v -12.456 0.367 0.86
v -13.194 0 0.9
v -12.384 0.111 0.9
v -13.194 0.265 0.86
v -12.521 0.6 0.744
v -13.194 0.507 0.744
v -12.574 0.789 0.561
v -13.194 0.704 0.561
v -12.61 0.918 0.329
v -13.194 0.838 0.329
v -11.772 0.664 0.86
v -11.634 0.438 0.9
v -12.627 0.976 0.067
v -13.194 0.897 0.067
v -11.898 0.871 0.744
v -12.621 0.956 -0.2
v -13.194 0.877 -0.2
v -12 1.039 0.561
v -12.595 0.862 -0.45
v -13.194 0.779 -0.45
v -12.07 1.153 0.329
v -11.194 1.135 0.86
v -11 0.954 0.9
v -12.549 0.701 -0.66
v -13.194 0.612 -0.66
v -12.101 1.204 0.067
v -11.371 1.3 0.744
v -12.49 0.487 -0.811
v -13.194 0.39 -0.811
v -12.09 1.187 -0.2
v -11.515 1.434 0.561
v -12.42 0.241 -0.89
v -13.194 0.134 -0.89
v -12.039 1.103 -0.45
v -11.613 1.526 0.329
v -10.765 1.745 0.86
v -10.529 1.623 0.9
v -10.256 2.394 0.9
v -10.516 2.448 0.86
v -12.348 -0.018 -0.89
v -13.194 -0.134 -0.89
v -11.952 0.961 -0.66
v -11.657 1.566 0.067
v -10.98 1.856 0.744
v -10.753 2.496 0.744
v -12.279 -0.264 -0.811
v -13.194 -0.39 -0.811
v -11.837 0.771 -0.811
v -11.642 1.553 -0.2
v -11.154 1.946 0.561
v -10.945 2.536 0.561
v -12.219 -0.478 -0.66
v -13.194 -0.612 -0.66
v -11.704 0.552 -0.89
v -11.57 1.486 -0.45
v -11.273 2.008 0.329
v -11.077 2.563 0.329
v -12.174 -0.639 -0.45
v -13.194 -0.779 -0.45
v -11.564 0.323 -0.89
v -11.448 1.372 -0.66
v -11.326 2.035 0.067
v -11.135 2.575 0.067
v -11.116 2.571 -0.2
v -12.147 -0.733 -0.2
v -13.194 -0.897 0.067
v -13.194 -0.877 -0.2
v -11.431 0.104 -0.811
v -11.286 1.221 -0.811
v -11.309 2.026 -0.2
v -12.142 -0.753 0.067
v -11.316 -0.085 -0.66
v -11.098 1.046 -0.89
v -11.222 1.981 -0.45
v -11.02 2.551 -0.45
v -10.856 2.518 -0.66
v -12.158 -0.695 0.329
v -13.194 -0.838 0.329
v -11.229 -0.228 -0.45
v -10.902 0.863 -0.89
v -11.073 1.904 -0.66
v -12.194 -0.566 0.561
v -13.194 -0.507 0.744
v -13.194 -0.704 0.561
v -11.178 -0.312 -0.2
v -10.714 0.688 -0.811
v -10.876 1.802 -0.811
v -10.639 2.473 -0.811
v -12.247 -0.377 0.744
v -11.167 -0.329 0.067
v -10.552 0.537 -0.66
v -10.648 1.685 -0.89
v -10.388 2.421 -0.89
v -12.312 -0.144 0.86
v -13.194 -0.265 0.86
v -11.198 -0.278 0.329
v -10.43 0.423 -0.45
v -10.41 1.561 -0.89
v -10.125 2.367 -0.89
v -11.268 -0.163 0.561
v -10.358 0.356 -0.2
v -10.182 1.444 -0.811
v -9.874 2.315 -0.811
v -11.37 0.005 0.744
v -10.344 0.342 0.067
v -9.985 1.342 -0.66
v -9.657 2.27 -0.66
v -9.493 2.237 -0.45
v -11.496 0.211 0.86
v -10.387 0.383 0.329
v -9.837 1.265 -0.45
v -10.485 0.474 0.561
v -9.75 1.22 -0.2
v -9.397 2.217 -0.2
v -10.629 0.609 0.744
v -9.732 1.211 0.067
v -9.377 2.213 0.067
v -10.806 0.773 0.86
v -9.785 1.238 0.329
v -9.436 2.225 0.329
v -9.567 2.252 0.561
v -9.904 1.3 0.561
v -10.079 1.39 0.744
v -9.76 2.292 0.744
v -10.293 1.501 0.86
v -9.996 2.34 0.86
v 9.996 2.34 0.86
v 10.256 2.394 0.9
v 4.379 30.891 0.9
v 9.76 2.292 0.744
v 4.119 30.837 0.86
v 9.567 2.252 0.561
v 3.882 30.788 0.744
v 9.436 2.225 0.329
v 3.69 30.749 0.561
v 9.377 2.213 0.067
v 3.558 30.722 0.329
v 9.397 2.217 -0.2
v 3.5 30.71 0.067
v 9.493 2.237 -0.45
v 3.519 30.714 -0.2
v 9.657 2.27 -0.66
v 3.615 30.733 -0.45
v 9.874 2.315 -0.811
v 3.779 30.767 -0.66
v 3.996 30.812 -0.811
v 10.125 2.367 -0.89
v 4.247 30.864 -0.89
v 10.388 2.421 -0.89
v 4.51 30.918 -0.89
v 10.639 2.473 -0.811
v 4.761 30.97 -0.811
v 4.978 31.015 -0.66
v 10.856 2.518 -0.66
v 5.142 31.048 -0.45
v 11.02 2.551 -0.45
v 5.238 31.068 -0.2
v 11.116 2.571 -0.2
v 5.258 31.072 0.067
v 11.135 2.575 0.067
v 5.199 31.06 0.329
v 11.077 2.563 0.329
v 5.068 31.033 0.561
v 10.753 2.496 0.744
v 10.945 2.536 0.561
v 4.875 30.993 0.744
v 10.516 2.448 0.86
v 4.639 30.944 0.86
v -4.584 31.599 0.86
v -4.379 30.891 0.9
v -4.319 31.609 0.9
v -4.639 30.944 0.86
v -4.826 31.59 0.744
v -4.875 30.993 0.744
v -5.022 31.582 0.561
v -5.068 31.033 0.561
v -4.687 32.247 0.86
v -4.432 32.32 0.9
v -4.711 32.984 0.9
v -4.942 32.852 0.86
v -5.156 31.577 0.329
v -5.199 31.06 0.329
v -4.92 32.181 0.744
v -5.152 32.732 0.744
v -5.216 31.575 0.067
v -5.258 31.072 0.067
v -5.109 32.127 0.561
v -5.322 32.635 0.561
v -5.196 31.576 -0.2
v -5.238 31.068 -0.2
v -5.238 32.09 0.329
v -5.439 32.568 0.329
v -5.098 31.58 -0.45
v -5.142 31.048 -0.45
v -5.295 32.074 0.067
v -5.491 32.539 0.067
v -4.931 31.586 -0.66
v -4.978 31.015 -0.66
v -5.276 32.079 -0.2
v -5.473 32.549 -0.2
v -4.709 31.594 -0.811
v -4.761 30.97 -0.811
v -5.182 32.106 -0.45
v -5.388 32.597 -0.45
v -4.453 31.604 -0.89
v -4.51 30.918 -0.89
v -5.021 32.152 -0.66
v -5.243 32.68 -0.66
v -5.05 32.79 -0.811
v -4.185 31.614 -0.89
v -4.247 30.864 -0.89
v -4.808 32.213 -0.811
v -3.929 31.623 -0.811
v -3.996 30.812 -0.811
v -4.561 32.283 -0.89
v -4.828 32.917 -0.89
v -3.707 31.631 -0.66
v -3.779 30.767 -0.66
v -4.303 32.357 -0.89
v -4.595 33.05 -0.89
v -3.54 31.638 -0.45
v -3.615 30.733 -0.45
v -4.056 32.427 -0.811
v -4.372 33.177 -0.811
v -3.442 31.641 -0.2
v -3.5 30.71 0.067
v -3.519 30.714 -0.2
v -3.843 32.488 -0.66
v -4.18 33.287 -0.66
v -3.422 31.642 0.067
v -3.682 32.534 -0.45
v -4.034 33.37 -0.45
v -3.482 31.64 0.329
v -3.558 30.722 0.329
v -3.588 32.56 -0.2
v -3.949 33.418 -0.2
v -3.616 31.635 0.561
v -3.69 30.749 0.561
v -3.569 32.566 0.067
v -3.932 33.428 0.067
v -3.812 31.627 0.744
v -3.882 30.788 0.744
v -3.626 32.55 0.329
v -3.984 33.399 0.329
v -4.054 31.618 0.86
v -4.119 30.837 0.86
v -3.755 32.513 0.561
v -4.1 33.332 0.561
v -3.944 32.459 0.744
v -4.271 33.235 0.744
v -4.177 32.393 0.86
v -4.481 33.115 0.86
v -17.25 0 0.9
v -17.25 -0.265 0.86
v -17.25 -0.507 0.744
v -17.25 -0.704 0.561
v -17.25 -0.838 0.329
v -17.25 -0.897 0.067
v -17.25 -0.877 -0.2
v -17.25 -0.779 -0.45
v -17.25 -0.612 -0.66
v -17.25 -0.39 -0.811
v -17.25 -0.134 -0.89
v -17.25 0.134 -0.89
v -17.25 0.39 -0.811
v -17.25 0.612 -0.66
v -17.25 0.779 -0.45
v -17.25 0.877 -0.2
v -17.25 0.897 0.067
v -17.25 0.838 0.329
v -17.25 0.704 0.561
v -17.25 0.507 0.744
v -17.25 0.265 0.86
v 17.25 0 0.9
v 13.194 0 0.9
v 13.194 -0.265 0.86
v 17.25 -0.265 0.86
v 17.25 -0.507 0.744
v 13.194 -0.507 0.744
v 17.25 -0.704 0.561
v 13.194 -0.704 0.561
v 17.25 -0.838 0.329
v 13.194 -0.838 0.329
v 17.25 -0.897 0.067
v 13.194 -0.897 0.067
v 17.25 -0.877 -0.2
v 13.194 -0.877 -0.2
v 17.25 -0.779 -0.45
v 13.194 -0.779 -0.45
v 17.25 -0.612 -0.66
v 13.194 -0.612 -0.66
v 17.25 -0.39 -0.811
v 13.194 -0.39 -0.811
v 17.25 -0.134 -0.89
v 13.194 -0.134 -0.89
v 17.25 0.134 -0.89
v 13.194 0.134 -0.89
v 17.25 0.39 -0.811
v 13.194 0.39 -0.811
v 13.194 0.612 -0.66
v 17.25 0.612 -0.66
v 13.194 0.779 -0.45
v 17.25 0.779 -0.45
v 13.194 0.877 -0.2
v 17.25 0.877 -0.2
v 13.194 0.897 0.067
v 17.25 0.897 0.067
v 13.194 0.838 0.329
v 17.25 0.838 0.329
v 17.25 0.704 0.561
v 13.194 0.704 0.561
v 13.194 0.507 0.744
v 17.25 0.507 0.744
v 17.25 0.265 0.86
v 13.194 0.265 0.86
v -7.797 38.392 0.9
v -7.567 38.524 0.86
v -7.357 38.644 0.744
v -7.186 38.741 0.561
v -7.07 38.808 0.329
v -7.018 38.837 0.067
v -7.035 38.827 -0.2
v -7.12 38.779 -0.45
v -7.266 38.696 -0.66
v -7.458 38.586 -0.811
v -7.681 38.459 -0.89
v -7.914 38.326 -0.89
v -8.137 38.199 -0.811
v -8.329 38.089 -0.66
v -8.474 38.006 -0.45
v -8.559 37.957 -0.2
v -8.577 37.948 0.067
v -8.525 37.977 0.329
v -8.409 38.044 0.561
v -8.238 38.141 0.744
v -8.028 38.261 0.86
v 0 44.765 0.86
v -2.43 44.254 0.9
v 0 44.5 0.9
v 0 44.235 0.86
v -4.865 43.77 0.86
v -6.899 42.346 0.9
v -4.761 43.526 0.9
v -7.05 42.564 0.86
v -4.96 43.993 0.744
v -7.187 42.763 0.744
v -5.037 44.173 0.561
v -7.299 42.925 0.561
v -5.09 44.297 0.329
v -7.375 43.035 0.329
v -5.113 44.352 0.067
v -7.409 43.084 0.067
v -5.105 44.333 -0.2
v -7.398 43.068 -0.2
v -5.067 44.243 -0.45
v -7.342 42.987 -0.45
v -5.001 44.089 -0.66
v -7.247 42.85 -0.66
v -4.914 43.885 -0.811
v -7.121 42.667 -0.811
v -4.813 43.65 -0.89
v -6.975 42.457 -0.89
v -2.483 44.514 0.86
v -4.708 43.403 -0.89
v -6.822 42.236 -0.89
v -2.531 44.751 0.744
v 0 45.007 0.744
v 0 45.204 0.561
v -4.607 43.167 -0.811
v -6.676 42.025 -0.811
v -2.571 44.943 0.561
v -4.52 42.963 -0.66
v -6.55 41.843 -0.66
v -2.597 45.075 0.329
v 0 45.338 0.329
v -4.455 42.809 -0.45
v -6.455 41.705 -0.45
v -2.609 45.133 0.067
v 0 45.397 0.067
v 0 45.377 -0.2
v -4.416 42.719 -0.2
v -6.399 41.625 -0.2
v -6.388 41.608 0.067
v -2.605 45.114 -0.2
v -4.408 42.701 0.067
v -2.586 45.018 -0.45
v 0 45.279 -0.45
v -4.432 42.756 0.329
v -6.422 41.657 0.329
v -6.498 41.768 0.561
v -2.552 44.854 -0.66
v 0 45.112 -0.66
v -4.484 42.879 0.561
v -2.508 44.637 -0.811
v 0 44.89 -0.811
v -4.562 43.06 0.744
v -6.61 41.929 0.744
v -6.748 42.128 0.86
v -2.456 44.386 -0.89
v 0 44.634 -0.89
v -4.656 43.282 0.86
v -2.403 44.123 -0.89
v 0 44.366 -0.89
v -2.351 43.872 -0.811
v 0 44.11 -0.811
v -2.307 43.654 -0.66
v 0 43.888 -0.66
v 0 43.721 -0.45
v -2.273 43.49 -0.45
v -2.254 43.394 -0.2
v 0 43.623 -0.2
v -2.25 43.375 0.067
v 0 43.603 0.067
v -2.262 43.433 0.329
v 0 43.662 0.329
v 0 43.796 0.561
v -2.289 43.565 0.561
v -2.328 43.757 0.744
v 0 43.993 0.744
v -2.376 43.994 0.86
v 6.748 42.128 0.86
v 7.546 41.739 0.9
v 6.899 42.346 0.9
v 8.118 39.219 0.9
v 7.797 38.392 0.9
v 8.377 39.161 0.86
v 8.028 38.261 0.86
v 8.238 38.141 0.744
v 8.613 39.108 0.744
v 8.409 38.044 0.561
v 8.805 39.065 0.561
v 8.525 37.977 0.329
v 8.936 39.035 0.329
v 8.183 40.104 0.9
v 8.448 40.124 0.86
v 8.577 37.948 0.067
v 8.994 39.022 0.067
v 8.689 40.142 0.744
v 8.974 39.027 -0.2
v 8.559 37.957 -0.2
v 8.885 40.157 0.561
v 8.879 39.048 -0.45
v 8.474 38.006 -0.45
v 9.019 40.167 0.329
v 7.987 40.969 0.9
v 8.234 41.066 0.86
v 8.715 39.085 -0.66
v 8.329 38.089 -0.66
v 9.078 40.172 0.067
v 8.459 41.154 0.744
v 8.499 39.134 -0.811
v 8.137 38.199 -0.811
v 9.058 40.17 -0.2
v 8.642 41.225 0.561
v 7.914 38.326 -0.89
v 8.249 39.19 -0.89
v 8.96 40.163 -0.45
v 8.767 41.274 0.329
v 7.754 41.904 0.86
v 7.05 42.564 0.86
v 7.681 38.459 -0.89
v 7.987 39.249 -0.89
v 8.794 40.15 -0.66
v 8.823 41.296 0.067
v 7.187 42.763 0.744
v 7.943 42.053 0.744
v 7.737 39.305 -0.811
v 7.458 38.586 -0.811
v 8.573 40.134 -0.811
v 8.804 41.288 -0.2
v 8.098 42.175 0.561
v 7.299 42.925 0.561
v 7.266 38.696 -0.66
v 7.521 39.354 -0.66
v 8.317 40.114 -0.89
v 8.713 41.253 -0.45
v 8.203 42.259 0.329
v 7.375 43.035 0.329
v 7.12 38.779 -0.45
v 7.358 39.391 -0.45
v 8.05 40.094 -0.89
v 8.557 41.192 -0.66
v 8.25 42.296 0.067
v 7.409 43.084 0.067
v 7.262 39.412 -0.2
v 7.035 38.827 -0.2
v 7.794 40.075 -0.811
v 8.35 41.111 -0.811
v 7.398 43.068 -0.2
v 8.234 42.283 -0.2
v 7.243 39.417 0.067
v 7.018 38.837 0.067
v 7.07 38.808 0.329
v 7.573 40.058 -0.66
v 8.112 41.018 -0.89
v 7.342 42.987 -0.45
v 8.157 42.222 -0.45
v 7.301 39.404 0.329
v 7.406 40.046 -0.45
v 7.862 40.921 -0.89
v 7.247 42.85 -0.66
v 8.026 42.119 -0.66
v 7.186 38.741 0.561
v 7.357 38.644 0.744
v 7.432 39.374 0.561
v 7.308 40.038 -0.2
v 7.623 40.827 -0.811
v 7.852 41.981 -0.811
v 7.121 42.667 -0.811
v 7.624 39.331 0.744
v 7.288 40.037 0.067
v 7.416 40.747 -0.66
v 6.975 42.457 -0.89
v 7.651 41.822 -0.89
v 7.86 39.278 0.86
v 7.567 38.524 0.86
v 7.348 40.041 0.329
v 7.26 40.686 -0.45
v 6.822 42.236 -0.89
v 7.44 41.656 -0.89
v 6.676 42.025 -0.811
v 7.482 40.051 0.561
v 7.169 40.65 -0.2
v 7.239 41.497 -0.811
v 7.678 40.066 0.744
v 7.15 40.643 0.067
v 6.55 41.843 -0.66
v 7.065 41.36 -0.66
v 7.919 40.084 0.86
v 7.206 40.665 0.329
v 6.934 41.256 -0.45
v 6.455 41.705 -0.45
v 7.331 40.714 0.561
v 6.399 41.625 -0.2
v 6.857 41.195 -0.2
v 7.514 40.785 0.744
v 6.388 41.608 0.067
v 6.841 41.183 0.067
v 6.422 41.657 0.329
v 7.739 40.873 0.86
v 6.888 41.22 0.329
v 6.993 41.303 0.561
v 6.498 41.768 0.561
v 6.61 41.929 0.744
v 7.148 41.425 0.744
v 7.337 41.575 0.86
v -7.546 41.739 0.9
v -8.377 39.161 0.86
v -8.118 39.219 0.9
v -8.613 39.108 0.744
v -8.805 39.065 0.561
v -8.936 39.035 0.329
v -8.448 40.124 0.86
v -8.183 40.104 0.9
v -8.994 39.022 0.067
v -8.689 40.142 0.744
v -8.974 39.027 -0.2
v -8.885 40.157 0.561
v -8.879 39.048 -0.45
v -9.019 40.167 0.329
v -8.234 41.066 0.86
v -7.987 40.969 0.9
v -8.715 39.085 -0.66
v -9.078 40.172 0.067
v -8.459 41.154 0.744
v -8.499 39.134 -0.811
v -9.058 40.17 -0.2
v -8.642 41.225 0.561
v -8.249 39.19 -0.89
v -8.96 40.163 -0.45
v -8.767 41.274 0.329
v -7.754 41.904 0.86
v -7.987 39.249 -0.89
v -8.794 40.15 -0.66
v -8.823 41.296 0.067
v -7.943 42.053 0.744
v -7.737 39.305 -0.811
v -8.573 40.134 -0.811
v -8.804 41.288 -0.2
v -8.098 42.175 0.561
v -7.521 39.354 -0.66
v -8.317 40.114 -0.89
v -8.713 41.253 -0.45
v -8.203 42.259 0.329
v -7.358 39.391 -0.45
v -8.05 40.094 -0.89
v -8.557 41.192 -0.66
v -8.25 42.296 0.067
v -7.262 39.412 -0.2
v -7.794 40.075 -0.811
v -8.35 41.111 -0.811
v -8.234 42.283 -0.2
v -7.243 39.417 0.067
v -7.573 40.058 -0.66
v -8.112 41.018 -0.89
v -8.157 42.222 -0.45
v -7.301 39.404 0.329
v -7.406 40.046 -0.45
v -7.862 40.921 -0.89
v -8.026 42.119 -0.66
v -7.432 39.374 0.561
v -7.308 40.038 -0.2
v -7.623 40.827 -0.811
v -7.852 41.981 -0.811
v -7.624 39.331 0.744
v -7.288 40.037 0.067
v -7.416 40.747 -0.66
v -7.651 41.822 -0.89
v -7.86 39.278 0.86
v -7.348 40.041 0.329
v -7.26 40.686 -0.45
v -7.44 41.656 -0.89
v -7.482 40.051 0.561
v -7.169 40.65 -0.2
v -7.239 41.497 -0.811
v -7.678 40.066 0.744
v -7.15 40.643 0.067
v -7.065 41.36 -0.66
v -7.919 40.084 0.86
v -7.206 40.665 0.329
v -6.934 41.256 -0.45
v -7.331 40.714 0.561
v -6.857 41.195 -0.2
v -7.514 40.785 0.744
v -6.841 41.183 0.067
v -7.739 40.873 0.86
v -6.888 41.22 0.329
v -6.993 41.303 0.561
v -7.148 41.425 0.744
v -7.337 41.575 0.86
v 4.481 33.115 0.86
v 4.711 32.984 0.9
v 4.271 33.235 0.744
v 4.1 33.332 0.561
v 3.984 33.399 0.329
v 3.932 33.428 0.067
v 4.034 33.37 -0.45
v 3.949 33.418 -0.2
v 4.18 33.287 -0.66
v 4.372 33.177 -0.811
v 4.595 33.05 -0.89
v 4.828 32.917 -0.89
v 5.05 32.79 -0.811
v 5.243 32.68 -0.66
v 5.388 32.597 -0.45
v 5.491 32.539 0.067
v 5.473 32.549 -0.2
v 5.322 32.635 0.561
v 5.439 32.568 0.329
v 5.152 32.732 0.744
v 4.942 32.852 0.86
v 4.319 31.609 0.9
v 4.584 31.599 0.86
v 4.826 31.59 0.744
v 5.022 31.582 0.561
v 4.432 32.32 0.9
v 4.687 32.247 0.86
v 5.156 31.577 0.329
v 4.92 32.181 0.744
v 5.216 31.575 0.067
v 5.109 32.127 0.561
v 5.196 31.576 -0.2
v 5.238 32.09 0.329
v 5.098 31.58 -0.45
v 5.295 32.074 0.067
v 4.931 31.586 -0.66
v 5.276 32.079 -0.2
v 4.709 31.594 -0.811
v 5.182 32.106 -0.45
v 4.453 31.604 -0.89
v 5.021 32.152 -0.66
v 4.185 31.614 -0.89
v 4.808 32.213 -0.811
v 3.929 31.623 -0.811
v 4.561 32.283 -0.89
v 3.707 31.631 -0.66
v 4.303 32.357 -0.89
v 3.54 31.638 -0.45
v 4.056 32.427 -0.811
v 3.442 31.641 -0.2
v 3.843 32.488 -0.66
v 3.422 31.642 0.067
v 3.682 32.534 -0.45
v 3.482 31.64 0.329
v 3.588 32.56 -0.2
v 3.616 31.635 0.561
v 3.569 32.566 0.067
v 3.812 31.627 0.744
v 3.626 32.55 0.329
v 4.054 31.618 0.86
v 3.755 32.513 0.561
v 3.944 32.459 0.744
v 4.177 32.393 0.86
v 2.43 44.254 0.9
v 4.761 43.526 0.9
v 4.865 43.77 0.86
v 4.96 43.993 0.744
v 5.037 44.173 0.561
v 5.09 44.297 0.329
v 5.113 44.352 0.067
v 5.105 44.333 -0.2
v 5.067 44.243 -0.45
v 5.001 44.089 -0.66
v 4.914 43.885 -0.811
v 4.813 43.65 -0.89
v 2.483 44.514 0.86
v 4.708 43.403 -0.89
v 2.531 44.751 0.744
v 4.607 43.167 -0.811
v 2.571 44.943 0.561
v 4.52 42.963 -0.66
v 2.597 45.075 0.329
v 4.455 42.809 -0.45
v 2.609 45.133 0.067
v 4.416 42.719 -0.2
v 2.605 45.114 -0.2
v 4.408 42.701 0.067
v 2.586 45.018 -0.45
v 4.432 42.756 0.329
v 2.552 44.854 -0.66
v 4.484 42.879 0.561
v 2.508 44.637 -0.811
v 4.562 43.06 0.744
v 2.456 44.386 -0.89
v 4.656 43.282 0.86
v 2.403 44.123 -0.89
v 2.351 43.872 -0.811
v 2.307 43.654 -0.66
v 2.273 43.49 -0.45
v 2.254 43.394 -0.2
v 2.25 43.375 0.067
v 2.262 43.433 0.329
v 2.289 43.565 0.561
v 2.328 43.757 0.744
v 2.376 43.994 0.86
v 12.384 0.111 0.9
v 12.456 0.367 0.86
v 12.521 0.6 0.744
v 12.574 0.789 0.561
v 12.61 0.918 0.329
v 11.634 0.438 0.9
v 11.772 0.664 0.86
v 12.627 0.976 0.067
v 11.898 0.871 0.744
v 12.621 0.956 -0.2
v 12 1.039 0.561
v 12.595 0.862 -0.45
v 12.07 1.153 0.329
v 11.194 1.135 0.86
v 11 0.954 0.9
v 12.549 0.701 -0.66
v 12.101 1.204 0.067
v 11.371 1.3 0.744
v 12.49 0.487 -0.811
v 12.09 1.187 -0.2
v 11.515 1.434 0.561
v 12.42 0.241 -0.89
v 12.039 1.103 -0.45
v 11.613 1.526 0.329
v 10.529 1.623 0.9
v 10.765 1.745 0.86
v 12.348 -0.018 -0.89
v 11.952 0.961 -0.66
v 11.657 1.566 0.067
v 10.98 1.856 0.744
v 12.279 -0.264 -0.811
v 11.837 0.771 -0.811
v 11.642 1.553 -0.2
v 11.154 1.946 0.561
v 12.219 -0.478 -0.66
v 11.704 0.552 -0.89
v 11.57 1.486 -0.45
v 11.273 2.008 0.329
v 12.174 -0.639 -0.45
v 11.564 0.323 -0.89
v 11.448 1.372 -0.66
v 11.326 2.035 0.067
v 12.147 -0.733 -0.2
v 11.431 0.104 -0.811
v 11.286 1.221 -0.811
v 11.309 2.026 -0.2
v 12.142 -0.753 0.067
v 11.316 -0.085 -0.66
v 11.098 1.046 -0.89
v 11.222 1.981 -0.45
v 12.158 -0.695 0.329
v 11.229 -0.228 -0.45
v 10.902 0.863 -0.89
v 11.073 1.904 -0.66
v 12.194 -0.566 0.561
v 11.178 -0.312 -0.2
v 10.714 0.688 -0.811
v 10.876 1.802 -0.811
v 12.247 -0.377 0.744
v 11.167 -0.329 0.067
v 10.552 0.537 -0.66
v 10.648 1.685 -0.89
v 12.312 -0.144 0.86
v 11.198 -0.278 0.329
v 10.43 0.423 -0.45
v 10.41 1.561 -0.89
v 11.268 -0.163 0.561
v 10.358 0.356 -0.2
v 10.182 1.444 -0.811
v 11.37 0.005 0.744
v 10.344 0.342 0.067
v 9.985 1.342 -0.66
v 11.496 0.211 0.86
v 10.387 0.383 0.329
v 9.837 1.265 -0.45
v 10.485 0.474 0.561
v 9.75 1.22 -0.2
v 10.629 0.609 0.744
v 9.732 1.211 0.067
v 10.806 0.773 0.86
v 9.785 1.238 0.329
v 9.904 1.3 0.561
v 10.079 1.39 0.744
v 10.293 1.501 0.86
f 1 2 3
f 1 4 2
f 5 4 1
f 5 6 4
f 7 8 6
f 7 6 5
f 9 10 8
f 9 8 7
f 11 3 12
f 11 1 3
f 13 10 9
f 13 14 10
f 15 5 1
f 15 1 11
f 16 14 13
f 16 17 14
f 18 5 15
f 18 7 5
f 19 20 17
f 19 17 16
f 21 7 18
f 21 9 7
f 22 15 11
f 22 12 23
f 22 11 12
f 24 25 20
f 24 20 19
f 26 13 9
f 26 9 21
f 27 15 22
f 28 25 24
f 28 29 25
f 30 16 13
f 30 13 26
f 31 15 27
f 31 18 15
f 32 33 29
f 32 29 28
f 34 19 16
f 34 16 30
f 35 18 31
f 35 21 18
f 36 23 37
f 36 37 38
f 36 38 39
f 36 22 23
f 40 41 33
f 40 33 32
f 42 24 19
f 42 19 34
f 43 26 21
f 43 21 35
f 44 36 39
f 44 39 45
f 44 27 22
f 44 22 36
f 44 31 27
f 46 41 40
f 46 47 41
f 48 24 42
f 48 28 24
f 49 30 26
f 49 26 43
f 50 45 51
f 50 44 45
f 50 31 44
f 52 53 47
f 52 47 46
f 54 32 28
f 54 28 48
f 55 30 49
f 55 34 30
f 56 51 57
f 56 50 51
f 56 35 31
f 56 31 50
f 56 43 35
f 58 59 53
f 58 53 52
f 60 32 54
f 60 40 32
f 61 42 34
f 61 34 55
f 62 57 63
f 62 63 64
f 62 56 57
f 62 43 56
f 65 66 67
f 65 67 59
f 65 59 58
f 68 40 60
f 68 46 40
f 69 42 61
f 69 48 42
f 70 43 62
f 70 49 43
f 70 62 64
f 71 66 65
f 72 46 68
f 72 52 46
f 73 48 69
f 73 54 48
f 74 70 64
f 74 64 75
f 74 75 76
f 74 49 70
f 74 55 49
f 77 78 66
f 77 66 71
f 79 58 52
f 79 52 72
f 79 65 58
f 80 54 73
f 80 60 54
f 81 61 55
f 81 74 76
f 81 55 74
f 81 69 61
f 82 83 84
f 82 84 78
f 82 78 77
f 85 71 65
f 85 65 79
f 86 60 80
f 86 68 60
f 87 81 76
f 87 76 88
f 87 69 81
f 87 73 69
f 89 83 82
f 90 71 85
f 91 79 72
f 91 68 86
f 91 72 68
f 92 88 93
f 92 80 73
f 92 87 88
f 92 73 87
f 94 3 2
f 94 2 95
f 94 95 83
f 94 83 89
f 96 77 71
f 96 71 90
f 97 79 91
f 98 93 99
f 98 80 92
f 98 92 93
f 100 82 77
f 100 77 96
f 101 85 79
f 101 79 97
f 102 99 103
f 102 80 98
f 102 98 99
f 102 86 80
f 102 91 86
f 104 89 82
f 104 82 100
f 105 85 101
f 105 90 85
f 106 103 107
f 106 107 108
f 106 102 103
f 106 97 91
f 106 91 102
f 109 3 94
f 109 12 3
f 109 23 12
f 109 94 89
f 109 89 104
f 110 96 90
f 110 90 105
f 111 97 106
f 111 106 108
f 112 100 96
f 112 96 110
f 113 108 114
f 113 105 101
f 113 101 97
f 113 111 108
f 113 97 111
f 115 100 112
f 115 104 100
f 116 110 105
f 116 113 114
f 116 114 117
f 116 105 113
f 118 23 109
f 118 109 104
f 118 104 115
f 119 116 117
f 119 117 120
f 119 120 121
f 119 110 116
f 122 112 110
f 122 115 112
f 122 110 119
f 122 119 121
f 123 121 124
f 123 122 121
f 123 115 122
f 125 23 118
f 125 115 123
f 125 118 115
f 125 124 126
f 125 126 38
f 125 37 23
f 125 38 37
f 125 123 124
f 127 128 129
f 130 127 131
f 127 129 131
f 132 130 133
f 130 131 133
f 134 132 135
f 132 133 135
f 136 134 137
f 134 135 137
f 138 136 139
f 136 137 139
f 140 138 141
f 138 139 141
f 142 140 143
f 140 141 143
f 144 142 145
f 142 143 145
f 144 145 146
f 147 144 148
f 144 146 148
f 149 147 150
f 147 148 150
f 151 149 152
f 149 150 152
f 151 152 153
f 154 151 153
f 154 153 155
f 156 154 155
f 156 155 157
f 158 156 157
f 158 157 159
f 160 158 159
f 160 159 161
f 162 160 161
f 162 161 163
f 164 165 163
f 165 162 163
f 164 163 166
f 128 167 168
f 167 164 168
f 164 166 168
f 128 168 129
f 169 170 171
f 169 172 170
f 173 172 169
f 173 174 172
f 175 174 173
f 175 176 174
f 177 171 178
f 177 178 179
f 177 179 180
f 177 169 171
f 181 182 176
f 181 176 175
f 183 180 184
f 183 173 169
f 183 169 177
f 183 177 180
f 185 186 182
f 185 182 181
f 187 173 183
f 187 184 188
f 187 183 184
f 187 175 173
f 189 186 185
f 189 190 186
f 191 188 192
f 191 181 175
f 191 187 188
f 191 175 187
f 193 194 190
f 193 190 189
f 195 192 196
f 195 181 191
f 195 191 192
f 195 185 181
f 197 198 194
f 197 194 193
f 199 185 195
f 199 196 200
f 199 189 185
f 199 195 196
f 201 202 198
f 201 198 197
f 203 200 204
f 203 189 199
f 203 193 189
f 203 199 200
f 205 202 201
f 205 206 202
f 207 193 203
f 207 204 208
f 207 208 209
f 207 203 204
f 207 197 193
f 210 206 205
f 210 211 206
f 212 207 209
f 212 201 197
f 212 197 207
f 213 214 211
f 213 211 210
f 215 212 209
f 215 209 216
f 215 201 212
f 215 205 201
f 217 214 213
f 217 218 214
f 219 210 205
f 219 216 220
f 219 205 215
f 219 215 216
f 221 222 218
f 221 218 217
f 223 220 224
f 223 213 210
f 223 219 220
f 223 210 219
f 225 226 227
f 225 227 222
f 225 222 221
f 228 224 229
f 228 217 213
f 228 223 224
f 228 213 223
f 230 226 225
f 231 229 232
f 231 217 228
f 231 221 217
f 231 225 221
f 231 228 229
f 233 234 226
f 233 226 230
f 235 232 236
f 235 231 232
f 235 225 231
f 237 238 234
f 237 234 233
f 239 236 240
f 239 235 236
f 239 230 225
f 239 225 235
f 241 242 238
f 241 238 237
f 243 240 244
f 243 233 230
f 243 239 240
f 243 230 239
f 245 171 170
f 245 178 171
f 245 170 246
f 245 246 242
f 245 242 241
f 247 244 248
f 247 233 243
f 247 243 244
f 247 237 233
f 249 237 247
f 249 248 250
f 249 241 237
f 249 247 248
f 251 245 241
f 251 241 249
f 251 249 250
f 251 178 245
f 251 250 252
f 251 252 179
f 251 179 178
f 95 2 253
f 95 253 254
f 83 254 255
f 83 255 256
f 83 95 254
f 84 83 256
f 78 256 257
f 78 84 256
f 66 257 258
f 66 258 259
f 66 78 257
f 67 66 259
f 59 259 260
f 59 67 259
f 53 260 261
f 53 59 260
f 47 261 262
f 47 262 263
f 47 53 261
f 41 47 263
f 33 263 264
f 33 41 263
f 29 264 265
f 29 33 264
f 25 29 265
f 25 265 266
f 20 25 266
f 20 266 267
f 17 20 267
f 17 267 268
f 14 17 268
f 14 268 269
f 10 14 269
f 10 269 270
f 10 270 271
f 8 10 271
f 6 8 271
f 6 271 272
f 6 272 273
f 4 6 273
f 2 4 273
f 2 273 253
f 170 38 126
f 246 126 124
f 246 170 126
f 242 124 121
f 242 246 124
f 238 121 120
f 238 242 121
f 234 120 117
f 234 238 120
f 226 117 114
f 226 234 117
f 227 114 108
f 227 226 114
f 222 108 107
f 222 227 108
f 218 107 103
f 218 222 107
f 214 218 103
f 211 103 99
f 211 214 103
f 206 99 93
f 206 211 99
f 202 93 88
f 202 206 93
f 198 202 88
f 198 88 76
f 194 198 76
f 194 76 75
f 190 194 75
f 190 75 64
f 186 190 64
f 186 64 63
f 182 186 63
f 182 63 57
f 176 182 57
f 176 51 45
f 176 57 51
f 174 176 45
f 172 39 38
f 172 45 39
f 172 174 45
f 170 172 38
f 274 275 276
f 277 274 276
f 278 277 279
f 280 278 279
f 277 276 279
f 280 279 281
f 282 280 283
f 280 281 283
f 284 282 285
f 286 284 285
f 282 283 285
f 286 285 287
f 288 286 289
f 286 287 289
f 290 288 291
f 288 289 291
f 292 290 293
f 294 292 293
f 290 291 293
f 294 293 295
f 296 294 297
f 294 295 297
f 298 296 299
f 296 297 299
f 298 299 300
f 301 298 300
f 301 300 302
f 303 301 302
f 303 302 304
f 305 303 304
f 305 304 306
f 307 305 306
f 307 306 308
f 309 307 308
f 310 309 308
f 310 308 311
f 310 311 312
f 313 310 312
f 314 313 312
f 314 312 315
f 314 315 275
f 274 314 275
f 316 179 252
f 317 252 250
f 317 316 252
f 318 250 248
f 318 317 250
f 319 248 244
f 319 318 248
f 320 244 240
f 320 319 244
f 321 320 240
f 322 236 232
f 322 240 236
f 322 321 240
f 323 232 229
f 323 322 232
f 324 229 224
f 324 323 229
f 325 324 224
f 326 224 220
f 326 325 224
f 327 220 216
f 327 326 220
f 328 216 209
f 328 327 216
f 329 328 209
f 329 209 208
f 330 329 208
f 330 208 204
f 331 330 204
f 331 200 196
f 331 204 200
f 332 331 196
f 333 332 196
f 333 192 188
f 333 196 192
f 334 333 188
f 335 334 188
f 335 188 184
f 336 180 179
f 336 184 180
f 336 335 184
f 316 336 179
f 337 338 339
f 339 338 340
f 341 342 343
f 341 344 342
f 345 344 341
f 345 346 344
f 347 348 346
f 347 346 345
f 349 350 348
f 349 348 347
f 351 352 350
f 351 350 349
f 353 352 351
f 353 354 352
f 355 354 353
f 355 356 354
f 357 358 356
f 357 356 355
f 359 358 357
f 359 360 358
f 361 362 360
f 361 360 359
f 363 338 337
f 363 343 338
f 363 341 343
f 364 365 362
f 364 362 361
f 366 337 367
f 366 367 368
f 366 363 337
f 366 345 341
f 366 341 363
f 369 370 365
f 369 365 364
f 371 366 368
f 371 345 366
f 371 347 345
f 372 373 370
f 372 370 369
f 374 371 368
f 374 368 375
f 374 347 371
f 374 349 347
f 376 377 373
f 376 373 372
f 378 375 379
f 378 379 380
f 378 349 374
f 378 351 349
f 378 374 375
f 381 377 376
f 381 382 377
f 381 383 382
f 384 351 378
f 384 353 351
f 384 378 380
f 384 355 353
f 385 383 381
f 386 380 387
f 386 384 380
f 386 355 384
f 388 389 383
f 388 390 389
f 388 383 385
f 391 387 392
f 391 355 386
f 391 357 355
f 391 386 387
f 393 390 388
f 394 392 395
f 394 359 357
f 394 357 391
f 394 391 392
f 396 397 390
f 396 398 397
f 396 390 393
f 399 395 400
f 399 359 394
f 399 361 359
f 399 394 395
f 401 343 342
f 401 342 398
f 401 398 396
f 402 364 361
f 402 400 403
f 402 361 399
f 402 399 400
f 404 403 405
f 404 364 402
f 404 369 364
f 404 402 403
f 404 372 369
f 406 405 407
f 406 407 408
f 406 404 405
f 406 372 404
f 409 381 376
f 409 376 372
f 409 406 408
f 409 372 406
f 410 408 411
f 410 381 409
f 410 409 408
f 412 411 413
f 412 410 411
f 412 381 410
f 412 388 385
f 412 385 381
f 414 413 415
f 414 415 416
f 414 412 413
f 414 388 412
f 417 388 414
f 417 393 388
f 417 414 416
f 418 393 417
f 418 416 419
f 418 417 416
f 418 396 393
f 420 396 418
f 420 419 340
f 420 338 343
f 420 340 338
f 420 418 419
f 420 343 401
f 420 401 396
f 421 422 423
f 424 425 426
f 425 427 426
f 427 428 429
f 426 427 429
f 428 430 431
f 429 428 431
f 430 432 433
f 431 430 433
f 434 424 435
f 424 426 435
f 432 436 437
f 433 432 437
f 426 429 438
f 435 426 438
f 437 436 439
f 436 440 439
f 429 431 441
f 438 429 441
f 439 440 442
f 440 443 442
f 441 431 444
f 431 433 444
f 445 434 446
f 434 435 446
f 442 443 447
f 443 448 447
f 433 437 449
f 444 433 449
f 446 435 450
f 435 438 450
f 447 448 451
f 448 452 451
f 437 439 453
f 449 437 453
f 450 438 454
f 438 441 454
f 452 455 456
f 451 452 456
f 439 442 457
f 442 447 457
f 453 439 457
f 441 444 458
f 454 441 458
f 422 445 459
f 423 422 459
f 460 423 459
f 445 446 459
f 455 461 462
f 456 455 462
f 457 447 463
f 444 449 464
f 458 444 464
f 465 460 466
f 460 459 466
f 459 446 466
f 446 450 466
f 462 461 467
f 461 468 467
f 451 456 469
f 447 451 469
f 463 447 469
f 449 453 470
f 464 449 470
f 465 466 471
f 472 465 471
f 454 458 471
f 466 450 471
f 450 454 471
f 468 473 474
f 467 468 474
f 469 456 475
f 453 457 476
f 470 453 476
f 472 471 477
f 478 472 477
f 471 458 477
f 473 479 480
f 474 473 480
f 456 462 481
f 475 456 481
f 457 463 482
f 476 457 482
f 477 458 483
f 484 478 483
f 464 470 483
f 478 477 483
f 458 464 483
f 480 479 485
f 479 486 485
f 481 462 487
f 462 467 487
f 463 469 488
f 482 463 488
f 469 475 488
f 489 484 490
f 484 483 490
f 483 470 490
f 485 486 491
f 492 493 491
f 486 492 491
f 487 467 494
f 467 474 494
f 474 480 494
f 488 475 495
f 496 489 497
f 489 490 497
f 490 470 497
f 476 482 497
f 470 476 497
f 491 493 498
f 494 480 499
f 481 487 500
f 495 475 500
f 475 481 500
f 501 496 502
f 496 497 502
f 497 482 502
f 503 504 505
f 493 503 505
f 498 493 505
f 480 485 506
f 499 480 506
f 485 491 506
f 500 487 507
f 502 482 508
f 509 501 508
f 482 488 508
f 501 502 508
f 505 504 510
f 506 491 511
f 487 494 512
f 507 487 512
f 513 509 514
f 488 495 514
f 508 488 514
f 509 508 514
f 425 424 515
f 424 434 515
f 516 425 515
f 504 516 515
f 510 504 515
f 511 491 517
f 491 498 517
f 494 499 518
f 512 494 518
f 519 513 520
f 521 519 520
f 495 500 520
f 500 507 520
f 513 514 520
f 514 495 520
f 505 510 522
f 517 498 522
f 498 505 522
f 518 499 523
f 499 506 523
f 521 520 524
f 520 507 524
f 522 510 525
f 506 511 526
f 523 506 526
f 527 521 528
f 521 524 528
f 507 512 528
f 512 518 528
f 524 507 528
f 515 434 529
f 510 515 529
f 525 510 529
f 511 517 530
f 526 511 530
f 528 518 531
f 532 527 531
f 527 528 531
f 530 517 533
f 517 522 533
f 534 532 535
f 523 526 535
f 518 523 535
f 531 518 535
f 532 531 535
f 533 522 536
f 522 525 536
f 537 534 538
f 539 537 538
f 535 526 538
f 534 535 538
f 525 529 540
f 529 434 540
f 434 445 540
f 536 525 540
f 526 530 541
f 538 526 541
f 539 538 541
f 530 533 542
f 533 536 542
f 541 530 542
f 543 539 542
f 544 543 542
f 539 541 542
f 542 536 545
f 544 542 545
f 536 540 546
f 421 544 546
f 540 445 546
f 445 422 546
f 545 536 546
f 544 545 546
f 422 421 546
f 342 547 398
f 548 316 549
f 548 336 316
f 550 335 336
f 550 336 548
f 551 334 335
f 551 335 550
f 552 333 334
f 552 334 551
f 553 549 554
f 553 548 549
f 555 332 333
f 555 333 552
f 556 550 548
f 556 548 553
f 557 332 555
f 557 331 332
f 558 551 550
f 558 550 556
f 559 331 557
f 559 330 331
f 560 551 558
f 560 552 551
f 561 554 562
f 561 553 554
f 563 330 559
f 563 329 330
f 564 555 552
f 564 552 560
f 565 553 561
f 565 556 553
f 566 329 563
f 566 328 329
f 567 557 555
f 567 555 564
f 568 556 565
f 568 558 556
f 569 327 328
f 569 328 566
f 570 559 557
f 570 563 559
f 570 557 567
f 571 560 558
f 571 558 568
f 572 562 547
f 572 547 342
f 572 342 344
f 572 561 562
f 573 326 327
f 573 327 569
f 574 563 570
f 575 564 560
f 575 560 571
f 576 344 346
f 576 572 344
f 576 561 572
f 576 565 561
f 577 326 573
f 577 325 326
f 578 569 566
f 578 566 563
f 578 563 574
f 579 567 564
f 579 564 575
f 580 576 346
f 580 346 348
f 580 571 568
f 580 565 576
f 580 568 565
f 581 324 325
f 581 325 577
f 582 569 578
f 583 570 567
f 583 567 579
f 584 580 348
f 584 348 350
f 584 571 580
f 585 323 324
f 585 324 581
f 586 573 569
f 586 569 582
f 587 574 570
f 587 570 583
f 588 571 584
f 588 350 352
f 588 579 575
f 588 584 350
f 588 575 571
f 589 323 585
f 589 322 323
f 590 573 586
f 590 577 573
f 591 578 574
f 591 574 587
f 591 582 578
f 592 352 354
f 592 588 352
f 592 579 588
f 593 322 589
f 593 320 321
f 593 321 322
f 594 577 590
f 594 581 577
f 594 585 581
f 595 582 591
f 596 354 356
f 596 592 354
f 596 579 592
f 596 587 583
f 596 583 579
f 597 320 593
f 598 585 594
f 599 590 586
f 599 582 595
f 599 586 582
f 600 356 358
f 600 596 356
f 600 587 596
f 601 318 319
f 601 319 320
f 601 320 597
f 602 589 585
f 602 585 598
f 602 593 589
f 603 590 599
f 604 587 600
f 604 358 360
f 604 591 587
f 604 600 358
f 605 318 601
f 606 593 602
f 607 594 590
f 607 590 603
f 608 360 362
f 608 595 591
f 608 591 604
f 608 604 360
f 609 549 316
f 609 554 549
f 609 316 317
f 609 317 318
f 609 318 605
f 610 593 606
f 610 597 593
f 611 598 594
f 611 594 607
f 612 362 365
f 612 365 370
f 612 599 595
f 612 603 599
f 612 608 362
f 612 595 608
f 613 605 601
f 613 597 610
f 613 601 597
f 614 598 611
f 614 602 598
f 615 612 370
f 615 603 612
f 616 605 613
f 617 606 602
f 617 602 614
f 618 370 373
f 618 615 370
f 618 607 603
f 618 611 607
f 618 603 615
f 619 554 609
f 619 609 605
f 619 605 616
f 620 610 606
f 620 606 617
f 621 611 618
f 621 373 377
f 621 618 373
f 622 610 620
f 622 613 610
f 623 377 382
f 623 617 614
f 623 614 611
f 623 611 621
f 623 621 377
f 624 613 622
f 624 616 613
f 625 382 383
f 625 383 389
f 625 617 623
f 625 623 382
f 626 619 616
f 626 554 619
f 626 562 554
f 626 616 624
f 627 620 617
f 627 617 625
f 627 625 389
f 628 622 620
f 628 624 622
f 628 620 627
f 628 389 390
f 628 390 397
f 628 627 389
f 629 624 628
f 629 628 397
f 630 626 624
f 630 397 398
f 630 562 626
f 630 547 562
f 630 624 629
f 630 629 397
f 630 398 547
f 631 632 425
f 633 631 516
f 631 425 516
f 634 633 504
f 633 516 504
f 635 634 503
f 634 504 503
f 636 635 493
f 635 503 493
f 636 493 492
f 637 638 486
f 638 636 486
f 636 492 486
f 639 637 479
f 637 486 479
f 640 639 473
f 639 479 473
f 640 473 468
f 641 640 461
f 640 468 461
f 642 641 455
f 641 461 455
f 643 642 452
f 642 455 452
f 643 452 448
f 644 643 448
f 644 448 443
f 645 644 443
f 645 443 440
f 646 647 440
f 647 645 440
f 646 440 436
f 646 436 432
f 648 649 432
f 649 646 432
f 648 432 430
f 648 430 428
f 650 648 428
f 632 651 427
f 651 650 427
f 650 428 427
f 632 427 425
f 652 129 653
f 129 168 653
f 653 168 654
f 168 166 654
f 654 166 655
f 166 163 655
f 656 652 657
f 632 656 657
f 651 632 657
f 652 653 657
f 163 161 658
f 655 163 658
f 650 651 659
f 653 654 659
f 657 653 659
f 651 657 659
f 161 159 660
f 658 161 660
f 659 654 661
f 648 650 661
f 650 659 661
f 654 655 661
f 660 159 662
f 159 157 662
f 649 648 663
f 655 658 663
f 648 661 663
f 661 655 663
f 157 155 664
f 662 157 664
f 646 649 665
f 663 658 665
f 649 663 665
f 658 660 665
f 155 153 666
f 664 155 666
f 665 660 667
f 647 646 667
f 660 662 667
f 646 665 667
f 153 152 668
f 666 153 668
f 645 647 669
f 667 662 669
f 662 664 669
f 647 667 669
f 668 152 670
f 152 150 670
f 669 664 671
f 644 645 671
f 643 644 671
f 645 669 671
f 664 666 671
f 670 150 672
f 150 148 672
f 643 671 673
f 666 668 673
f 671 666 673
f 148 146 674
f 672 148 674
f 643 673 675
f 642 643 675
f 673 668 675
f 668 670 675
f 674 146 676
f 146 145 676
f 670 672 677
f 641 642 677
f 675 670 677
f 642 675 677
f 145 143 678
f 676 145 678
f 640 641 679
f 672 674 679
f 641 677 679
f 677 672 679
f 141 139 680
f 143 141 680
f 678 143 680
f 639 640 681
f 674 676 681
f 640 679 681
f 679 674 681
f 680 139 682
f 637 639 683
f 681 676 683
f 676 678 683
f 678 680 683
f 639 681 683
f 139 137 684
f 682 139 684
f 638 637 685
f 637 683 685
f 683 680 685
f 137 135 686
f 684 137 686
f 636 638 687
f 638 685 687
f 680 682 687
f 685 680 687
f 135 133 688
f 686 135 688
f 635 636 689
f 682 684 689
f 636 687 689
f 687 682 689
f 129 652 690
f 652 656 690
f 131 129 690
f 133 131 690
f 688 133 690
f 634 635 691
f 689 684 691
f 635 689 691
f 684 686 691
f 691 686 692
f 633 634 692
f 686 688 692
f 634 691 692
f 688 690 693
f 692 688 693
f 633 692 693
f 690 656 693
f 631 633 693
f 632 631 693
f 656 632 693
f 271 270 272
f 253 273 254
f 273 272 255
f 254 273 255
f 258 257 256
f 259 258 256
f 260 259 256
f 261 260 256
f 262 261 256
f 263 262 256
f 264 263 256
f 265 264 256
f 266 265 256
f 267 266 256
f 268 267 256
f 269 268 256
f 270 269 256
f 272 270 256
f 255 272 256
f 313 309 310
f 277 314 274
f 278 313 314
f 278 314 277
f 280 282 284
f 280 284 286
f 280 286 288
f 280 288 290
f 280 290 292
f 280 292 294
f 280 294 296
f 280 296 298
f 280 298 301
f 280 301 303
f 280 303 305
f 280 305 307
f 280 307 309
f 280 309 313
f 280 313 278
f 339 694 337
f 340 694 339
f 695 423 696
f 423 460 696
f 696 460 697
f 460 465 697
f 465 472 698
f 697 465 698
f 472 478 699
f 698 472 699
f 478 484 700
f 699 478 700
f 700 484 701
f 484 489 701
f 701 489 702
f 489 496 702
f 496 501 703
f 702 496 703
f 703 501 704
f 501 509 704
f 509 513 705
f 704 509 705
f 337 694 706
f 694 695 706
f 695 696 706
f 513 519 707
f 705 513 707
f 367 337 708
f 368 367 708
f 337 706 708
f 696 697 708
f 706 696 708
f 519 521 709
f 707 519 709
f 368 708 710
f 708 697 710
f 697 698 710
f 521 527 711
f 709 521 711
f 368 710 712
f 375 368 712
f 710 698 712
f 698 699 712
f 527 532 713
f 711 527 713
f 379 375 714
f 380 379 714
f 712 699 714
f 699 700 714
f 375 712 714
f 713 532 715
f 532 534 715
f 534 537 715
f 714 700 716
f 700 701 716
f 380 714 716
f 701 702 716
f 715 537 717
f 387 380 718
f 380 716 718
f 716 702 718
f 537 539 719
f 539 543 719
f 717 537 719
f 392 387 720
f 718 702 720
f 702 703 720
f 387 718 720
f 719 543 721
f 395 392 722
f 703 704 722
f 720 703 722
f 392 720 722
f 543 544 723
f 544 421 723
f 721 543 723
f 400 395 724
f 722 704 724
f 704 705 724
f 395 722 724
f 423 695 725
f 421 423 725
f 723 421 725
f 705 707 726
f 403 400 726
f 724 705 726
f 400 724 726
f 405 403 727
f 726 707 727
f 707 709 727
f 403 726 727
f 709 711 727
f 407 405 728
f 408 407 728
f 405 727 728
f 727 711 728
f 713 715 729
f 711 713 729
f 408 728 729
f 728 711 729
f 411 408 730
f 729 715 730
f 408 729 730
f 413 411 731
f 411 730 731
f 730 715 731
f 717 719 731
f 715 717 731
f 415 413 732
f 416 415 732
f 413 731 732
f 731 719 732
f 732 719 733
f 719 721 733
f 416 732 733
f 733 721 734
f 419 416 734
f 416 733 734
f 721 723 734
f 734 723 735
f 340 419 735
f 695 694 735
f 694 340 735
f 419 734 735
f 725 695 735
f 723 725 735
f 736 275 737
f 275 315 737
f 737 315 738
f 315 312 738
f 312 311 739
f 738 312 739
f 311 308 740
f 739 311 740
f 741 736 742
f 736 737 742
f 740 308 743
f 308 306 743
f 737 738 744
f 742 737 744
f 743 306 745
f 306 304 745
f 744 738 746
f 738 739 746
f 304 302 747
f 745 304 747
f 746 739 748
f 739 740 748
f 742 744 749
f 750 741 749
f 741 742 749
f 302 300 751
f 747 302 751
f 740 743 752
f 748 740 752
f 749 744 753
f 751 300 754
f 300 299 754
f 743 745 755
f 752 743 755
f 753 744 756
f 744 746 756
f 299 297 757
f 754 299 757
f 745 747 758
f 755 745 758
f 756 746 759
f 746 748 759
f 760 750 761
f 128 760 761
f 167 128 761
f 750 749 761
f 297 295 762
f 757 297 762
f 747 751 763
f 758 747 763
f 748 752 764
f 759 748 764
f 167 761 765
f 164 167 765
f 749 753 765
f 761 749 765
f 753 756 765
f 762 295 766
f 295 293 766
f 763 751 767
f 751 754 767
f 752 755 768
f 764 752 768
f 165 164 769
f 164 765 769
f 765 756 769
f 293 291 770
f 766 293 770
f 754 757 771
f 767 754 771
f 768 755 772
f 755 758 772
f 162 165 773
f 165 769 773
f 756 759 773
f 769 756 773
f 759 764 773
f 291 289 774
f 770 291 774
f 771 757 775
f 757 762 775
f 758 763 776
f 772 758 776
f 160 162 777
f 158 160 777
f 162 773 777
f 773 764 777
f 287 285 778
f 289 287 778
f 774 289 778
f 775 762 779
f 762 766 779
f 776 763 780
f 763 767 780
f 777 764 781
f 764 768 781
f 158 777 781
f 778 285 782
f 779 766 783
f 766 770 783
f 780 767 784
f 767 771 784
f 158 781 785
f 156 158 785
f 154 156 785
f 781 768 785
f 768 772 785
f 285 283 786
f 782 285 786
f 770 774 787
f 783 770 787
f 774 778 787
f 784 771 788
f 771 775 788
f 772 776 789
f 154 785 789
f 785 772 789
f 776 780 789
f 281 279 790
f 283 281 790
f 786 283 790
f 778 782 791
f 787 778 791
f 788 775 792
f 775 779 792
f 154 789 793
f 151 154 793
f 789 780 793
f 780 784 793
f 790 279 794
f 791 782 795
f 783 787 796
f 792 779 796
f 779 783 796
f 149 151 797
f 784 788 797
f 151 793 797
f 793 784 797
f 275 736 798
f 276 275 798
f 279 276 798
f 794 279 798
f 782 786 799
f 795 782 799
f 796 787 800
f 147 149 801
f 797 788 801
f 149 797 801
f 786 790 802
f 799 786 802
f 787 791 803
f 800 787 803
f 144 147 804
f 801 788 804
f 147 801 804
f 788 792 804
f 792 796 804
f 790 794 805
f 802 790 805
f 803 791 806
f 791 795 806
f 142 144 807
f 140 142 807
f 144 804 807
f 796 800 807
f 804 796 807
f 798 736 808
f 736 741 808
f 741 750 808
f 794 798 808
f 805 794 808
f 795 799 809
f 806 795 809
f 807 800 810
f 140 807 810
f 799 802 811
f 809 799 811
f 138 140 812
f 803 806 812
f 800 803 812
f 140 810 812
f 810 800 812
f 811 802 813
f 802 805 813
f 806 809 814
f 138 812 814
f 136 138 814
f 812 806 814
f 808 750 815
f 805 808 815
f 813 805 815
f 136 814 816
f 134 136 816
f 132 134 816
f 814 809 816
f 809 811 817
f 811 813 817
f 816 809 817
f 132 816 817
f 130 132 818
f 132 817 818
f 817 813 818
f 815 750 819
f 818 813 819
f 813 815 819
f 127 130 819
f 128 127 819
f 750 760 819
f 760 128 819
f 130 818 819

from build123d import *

# Parameters (mm, degrees)
SWEEP1_PROFILE_R = 0.9


with BuildPart() as part:
    # Sweep1: sweep along a path in Sketch1
    with BuildLine(Plane.XY) as sweep1_path:
        Line((-17.25, 0), (-13.194394065, 0))
        ThreePointArc((-13.194394065, 0), (-11.299398684, 0.674275918), (-10.25623647, 2.394004996))
        Line((-10.25623647, 2.394004996), (-4.378759304, 30.89086398))
        ThreePointArc((-4.378759304, 30.89086398), (-4.354076366, 31.967577555), (-4.711244766, 32.983624848))
        Line((-4.711244766, 32.983624848), (-7.797395206, 38.392342113))
        ThreePointArc((-7.797395206, 38.392342113), (-8.11709006, 40.544110227), (-6.898590932, 42.34621197))
        ThreePointArc((-6.898590932, 42.34621197), (-3.613494144, 43.949034952), (0, 44.5))
    # Sweep1 profile (on start of the path) → Sweep1 (sweep)
    with BuildSketch(Plane(origin=(-17.25, 0, 0), x_dir=(0, 0, 1), z_dir=(1, 0, 0))):
        Circle(SWEEP1_PROFILE_R)
    sweep1 = sweep(path=sweep1_path.line)

    # Mirror1: Sweep1 across plane
    add(sweep1.mirror(Plane(origin=(0, 0, 0), x_dir=(0, 0, 1), z_dir=(1, 0, 0))))


solid = part.part
